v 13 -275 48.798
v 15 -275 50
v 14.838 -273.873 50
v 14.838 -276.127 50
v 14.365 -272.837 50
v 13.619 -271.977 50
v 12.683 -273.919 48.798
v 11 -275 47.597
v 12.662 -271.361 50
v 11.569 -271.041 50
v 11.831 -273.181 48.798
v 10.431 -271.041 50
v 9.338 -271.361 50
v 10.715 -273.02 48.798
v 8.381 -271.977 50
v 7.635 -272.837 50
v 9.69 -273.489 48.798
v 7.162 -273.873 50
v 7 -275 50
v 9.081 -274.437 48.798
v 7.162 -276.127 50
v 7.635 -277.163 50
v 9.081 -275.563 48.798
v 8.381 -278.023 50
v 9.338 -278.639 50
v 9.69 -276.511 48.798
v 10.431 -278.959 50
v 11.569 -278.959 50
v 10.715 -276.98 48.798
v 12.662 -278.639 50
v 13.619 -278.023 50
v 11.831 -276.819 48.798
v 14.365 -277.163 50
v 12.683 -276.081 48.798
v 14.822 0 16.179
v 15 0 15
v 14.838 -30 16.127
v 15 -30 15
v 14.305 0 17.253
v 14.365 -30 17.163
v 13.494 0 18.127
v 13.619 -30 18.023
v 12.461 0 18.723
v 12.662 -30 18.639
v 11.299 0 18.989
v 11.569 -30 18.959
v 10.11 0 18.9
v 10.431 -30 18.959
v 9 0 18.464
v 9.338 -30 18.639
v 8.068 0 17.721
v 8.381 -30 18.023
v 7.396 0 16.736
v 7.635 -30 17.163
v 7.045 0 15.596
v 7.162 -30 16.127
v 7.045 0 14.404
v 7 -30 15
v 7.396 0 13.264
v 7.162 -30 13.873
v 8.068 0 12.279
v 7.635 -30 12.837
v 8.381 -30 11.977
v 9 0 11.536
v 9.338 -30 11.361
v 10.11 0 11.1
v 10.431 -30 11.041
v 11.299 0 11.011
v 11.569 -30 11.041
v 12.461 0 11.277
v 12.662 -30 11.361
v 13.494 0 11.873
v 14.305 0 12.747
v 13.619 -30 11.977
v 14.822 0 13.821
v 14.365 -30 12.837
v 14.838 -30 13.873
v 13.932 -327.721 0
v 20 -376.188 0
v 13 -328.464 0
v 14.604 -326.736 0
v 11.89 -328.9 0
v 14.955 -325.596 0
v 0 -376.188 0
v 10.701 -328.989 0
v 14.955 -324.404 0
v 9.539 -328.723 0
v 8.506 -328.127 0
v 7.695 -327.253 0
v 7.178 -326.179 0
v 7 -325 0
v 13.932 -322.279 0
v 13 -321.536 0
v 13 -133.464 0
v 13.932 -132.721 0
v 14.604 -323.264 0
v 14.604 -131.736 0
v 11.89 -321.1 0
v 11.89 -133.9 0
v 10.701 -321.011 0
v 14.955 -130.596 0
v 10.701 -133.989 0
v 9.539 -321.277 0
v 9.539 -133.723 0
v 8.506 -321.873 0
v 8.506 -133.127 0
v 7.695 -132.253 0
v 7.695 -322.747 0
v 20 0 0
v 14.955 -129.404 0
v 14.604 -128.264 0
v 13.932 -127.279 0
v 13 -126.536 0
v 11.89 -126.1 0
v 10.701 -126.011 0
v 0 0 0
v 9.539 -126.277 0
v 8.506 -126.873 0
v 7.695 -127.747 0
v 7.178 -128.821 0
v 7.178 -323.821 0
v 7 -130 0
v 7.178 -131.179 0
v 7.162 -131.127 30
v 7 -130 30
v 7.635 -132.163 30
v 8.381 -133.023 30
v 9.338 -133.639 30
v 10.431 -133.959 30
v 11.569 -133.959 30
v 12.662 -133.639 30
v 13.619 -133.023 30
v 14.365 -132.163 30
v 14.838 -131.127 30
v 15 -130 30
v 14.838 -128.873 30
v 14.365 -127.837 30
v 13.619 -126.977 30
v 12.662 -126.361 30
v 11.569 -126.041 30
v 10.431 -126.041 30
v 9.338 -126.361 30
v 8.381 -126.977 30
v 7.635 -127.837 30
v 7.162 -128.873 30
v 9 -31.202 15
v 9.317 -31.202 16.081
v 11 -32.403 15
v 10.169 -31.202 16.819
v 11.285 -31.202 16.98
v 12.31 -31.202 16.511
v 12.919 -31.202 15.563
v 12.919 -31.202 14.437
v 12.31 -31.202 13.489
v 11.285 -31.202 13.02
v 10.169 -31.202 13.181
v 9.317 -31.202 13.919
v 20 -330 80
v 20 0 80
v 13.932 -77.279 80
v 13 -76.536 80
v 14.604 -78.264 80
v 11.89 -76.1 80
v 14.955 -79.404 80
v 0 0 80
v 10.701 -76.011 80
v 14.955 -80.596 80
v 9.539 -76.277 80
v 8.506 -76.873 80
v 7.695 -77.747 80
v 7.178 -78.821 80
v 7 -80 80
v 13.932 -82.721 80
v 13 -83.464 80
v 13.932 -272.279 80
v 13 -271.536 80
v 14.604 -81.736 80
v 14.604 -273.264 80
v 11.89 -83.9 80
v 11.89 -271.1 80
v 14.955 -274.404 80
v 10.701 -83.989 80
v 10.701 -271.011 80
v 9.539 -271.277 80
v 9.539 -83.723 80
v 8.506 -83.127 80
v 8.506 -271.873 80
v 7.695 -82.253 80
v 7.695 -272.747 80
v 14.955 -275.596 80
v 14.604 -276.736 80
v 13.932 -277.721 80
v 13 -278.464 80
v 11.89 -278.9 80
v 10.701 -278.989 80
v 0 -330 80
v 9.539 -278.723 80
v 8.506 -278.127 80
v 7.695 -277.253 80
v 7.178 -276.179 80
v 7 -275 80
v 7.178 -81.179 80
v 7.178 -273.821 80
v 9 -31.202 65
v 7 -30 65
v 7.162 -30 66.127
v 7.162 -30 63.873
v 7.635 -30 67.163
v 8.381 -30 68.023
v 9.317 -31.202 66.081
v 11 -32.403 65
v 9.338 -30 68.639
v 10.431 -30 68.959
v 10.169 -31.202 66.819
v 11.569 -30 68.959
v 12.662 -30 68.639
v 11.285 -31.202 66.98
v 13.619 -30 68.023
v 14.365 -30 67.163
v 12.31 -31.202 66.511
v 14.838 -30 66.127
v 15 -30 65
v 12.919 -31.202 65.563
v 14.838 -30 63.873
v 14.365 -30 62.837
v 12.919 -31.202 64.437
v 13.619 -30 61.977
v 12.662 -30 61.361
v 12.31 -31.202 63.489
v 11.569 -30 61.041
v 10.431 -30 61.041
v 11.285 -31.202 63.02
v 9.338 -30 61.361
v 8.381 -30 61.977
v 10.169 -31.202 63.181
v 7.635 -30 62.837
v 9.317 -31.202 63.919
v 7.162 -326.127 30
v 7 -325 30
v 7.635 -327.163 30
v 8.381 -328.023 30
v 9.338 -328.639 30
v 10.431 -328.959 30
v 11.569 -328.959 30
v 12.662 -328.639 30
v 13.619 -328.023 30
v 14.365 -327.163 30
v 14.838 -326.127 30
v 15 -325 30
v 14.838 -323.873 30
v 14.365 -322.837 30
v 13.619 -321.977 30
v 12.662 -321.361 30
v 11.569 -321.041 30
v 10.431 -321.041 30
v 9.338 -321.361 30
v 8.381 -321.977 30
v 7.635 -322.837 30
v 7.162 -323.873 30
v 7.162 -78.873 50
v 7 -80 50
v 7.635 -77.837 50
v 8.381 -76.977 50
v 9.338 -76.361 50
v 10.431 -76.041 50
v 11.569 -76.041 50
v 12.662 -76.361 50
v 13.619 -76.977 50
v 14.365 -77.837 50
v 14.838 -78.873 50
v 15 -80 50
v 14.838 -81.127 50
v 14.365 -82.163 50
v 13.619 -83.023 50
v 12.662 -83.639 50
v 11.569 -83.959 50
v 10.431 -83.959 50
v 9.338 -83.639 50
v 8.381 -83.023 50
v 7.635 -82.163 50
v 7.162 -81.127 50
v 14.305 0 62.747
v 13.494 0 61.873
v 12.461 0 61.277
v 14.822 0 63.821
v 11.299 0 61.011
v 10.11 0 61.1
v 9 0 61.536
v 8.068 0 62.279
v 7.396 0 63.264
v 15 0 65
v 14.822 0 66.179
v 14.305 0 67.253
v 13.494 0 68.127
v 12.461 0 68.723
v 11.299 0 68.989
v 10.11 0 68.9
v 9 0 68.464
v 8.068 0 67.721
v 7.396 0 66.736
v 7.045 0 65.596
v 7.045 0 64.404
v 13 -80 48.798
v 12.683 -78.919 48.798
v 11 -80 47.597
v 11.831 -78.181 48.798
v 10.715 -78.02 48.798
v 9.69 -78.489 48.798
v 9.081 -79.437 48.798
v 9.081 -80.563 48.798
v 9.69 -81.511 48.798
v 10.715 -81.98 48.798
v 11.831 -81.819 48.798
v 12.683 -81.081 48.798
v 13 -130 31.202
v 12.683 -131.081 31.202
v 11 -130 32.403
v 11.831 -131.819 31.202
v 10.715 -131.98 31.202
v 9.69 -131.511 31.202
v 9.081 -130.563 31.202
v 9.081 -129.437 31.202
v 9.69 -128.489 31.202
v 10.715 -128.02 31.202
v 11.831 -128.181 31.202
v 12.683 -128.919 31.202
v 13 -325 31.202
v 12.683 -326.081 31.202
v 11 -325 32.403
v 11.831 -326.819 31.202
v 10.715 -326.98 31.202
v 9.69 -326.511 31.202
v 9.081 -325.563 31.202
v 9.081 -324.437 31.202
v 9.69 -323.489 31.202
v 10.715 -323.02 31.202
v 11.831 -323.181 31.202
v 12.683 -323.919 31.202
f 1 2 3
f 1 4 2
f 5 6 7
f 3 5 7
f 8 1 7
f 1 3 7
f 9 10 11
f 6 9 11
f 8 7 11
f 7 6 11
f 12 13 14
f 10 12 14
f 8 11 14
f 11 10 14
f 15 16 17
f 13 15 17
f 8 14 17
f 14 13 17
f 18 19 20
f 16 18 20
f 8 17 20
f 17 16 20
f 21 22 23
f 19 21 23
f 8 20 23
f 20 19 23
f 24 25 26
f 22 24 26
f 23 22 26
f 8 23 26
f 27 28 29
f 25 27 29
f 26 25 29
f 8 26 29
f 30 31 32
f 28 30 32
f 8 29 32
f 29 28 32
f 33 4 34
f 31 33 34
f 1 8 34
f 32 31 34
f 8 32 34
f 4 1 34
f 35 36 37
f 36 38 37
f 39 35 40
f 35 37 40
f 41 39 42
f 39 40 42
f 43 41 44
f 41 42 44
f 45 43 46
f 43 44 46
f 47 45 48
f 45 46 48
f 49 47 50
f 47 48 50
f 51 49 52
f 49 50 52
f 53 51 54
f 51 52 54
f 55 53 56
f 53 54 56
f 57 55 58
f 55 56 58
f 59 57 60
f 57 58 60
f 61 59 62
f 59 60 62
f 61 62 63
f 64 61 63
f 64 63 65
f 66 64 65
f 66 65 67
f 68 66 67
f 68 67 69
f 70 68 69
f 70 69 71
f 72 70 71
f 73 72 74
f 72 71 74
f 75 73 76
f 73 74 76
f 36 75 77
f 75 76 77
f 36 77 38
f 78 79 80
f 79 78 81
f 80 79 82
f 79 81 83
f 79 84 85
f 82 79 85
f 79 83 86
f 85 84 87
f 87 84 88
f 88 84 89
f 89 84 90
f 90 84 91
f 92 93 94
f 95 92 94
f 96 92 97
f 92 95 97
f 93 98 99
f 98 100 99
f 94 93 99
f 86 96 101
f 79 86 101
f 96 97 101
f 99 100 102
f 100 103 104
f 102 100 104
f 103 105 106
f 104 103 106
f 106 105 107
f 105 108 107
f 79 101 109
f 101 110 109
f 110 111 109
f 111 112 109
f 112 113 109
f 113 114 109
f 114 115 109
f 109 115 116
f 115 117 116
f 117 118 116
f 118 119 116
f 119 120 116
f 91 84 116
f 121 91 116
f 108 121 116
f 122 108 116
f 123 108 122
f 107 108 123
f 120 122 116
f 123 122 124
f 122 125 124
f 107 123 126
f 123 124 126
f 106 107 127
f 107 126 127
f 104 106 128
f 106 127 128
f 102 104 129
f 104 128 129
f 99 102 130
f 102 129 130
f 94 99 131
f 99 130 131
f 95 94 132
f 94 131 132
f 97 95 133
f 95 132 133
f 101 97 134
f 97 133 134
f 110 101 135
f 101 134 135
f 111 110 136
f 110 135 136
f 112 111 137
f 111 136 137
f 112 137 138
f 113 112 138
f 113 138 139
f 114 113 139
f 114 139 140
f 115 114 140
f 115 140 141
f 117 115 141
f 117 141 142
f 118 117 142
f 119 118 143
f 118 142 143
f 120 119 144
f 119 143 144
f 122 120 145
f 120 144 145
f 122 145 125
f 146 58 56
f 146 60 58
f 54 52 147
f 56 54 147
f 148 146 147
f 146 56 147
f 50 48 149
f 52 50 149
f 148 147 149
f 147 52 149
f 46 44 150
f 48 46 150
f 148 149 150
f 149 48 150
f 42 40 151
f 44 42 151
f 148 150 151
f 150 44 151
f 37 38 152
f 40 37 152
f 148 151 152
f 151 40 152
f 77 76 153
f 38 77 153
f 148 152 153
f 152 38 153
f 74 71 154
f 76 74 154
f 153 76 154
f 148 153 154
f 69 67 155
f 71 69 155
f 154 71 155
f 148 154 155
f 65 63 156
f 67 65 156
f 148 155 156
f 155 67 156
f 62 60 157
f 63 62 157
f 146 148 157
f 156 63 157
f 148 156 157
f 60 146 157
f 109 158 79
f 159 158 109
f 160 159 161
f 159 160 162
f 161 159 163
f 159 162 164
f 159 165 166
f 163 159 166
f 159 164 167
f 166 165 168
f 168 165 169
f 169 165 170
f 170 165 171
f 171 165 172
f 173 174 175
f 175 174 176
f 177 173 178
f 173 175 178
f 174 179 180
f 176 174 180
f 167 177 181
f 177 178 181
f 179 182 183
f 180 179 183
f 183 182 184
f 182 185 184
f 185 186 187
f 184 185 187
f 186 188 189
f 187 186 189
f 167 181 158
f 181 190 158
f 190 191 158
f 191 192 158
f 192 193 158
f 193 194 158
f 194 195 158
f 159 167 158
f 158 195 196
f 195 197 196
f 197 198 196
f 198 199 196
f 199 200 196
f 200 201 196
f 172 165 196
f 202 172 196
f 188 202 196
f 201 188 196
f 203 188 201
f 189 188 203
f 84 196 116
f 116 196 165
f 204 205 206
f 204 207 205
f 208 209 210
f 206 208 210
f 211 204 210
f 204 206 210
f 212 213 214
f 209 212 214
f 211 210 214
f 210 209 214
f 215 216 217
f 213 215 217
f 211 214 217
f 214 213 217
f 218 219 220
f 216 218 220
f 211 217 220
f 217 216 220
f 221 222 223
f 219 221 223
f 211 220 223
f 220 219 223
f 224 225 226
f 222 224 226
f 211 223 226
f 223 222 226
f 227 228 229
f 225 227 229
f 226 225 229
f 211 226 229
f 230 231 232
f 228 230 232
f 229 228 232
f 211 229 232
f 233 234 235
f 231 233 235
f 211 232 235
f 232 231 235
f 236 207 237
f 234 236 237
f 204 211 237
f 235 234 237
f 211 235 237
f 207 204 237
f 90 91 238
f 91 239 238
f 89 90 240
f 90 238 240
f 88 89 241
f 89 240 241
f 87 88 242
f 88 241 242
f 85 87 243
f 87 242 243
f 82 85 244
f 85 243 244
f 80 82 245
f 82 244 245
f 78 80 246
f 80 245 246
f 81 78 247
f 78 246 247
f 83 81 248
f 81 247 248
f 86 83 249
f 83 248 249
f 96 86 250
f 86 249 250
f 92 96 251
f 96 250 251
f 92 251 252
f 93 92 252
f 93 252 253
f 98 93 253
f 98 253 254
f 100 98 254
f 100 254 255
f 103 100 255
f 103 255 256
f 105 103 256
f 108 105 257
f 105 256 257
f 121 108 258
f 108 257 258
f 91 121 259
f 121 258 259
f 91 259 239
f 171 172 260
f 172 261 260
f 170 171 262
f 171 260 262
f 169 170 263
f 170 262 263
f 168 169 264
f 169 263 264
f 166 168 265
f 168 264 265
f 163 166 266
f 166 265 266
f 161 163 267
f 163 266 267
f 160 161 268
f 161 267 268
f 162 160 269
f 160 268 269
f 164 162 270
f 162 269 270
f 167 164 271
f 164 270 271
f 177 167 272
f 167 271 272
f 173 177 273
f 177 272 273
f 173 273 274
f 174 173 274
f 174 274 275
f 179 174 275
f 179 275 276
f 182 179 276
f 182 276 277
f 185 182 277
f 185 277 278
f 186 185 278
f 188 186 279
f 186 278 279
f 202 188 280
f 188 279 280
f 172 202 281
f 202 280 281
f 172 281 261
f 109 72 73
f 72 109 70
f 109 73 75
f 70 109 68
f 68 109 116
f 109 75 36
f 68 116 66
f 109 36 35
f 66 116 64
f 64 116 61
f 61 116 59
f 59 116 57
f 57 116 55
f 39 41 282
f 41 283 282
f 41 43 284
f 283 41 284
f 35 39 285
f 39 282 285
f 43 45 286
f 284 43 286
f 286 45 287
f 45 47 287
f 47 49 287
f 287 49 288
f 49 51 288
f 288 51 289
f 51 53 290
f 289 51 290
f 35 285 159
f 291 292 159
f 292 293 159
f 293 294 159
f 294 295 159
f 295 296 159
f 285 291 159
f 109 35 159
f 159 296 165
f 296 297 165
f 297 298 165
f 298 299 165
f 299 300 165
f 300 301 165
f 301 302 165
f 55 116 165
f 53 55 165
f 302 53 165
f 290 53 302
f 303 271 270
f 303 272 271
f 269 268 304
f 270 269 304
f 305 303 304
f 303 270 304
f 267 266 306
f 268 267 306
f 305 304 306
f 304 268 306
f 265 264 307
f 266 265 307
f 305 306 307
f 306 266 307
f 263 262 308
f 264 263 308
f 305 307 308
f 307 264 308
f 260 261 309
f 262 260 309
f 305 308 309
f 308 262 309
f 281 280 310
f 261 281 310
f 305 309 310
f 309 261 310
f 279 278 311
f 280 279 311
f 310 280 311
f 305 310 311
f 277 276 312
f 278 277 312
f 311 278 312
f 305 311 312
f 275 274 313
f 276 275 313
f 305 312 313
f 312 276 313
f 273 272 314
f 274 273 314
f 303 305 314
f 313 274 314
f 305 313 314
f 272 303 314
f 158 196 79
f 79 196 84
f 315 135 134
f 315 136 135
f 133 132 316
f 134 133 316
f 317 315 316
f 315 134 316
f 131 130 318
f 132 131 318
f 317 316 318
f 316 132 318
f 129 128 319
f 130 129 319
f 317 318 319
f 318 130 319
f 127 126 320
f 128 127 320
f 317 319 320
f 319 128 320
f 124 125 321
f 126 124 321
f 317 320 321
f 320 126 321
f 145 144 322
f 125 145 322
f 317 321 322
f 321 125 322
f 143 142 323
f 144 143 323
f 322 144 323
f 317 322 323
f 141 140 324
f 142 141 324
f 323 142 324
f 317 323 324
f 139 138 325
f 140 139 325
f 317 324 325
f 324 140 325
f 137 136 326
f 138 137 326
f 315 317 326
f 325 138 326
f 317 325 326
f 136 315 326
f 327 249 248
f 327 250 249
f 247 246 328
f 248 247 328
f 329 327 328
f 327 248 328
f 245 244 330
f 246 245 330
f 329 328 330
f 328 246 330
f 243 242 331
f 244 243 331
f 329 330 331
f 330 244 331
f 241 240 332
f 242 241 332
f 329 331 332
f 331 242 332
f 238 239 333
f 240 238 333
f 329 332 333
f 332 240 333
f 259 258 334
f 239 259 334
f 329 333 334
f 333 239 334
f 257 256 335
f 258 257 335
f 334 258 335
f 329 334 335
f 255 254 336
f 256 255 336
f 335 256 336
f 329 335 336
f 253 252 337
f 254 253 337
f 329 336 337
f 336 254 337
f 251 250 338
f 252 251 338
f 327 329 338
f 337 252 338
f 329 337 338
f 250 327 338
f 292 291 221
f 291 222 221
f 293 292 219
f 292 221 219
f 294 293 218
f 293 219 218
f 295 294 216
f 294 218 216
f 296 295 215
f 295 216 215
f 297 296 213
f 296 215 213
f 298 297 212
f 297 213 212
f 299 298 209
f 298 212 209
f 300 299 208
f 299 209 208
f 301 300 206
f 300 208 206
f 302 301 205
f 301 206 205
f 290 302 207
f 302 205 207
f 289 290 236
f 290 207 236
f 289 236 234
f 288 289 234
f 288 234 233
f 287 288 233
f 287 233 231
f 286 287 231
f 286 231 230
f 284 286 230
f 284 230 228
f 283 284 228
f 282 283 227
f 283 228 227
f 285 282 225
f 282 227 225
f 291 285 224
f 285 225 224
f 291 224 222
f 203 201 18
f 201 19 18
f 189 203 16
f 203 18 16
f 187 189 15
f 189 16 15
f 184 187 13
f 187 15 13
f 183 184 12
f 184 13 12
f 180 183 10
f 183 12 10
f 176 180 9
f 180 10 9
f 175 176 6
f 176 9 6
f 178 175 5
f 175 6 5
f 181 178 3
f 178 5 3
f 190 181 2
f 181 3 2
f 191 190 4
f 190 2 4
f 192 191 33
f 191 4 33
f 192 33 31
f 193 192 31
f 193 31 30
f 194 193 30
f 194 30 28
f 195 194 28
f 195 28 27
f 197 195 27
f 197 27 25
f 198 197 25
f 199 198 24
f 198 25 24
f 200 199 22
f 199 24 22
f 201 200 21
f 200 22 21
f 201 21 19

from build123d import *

# Parameters (mm, degrees)
F1_DEPTH       = 20
F5_D           = 8
F5_DEPTH       = 30
F5_TIP         = 2.4034424761
F5_ON_F3_D     = 8
F5_ON_F3_DEPTH = 30
F5_ON_F3_TIP   = 2.4034424761
F5_ON_F4_D     = 8
F5_ON_F4_DEPTH = 30
F5_ON_F4_TIP   = 2.4034424761


with BuildPart() as f1:
    # F0 (on Right) → F1 (new body)
    with BuildSketch(Plane.YZ):
        Polygon((-376.1880215352, 0), (0, 0), (0, 80), (-330, 80), align=None)
    extrude(amount=F1_DEPTH)

    # F5
    with Locations(Plane(origin=(0, 0, 0), x_dir=(1, 0, 0), z_dir=(0, 0, -1))):
        with Locations((11, 325), (11, 130)):
            Hole(F5_D / 2, depth=F5_DEPTH)
            with Locations((0, 0, -(F5_DEPTH + F5_TIP / 2))):  # 118° drill point
                Cone(0, F5_D / 2, F5_TIP, mode=Mode.SUBTRACT)

    # F5 on F3
    with Locations(Plane(origin=(0, 0, 0), x_dir=(-1, 0, 0), z_dir=(0, 1, 0))):
        with Locations((-11, 15), (-11, 65)):
            Hole(F5_ON_F3_D / 2, depth=F5_ON_F3_DEPTH)
            with Locations((0, 0, -(F5_ON_F3_DEPTH + F5_ON_F3_TIP / 2))):  # 118° drill point
                Cone(0, F5_ON_F3_D / 2, F5_ON_F3_TIP, mode=Mode.SUBTRACT)

    # F5 on F4
    with Locations(Plane.XY.offset(80)):
        with Locations((11, -275), (11, -80)):
            Hole(F5_ON_F4_D / 2, depth=F5_ON_F4_DEPTH)
            with Locations((0, 0, -(F5_ON_F4_DEPTH + F5_ON_F4_TIP / 2))):  # 118° drill point
                Cone(0, F5_ON_F4_D / 2, F5_ON_F4_TIP, mode=Mode.SUBTRACT)


solid = f1.part
